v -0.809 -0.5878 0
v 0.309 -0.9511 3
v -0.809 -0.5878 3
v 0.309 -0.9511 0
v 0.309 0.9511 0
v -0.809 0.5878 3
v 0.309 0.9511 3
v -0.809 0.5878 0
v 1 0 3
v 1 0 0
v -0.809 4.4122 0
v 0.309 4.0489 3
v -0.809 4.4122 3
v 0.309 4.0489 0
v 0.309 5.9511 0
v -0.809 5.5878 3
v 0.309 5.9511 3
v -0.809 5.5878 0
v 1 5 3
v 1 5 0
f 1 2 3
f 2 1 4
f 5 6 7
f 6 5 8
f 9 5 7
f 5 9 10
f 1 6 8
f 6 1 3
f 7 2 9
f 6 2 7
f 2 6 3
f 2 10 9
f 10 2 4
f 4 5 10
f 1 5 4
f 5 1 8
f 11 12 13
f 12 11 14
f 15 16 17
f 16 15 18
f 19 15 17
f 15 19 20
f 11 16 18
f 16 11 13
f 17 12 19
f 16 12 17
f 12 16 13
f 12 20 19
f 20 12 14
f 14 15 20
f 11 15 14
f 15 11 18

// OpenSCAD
union() {
  translate([0, 0, 0]) cylinder(h=3, r=1, center=false);
  translate([0, 5, 0]) cylinder(h=3, r=1, center=false);
}
